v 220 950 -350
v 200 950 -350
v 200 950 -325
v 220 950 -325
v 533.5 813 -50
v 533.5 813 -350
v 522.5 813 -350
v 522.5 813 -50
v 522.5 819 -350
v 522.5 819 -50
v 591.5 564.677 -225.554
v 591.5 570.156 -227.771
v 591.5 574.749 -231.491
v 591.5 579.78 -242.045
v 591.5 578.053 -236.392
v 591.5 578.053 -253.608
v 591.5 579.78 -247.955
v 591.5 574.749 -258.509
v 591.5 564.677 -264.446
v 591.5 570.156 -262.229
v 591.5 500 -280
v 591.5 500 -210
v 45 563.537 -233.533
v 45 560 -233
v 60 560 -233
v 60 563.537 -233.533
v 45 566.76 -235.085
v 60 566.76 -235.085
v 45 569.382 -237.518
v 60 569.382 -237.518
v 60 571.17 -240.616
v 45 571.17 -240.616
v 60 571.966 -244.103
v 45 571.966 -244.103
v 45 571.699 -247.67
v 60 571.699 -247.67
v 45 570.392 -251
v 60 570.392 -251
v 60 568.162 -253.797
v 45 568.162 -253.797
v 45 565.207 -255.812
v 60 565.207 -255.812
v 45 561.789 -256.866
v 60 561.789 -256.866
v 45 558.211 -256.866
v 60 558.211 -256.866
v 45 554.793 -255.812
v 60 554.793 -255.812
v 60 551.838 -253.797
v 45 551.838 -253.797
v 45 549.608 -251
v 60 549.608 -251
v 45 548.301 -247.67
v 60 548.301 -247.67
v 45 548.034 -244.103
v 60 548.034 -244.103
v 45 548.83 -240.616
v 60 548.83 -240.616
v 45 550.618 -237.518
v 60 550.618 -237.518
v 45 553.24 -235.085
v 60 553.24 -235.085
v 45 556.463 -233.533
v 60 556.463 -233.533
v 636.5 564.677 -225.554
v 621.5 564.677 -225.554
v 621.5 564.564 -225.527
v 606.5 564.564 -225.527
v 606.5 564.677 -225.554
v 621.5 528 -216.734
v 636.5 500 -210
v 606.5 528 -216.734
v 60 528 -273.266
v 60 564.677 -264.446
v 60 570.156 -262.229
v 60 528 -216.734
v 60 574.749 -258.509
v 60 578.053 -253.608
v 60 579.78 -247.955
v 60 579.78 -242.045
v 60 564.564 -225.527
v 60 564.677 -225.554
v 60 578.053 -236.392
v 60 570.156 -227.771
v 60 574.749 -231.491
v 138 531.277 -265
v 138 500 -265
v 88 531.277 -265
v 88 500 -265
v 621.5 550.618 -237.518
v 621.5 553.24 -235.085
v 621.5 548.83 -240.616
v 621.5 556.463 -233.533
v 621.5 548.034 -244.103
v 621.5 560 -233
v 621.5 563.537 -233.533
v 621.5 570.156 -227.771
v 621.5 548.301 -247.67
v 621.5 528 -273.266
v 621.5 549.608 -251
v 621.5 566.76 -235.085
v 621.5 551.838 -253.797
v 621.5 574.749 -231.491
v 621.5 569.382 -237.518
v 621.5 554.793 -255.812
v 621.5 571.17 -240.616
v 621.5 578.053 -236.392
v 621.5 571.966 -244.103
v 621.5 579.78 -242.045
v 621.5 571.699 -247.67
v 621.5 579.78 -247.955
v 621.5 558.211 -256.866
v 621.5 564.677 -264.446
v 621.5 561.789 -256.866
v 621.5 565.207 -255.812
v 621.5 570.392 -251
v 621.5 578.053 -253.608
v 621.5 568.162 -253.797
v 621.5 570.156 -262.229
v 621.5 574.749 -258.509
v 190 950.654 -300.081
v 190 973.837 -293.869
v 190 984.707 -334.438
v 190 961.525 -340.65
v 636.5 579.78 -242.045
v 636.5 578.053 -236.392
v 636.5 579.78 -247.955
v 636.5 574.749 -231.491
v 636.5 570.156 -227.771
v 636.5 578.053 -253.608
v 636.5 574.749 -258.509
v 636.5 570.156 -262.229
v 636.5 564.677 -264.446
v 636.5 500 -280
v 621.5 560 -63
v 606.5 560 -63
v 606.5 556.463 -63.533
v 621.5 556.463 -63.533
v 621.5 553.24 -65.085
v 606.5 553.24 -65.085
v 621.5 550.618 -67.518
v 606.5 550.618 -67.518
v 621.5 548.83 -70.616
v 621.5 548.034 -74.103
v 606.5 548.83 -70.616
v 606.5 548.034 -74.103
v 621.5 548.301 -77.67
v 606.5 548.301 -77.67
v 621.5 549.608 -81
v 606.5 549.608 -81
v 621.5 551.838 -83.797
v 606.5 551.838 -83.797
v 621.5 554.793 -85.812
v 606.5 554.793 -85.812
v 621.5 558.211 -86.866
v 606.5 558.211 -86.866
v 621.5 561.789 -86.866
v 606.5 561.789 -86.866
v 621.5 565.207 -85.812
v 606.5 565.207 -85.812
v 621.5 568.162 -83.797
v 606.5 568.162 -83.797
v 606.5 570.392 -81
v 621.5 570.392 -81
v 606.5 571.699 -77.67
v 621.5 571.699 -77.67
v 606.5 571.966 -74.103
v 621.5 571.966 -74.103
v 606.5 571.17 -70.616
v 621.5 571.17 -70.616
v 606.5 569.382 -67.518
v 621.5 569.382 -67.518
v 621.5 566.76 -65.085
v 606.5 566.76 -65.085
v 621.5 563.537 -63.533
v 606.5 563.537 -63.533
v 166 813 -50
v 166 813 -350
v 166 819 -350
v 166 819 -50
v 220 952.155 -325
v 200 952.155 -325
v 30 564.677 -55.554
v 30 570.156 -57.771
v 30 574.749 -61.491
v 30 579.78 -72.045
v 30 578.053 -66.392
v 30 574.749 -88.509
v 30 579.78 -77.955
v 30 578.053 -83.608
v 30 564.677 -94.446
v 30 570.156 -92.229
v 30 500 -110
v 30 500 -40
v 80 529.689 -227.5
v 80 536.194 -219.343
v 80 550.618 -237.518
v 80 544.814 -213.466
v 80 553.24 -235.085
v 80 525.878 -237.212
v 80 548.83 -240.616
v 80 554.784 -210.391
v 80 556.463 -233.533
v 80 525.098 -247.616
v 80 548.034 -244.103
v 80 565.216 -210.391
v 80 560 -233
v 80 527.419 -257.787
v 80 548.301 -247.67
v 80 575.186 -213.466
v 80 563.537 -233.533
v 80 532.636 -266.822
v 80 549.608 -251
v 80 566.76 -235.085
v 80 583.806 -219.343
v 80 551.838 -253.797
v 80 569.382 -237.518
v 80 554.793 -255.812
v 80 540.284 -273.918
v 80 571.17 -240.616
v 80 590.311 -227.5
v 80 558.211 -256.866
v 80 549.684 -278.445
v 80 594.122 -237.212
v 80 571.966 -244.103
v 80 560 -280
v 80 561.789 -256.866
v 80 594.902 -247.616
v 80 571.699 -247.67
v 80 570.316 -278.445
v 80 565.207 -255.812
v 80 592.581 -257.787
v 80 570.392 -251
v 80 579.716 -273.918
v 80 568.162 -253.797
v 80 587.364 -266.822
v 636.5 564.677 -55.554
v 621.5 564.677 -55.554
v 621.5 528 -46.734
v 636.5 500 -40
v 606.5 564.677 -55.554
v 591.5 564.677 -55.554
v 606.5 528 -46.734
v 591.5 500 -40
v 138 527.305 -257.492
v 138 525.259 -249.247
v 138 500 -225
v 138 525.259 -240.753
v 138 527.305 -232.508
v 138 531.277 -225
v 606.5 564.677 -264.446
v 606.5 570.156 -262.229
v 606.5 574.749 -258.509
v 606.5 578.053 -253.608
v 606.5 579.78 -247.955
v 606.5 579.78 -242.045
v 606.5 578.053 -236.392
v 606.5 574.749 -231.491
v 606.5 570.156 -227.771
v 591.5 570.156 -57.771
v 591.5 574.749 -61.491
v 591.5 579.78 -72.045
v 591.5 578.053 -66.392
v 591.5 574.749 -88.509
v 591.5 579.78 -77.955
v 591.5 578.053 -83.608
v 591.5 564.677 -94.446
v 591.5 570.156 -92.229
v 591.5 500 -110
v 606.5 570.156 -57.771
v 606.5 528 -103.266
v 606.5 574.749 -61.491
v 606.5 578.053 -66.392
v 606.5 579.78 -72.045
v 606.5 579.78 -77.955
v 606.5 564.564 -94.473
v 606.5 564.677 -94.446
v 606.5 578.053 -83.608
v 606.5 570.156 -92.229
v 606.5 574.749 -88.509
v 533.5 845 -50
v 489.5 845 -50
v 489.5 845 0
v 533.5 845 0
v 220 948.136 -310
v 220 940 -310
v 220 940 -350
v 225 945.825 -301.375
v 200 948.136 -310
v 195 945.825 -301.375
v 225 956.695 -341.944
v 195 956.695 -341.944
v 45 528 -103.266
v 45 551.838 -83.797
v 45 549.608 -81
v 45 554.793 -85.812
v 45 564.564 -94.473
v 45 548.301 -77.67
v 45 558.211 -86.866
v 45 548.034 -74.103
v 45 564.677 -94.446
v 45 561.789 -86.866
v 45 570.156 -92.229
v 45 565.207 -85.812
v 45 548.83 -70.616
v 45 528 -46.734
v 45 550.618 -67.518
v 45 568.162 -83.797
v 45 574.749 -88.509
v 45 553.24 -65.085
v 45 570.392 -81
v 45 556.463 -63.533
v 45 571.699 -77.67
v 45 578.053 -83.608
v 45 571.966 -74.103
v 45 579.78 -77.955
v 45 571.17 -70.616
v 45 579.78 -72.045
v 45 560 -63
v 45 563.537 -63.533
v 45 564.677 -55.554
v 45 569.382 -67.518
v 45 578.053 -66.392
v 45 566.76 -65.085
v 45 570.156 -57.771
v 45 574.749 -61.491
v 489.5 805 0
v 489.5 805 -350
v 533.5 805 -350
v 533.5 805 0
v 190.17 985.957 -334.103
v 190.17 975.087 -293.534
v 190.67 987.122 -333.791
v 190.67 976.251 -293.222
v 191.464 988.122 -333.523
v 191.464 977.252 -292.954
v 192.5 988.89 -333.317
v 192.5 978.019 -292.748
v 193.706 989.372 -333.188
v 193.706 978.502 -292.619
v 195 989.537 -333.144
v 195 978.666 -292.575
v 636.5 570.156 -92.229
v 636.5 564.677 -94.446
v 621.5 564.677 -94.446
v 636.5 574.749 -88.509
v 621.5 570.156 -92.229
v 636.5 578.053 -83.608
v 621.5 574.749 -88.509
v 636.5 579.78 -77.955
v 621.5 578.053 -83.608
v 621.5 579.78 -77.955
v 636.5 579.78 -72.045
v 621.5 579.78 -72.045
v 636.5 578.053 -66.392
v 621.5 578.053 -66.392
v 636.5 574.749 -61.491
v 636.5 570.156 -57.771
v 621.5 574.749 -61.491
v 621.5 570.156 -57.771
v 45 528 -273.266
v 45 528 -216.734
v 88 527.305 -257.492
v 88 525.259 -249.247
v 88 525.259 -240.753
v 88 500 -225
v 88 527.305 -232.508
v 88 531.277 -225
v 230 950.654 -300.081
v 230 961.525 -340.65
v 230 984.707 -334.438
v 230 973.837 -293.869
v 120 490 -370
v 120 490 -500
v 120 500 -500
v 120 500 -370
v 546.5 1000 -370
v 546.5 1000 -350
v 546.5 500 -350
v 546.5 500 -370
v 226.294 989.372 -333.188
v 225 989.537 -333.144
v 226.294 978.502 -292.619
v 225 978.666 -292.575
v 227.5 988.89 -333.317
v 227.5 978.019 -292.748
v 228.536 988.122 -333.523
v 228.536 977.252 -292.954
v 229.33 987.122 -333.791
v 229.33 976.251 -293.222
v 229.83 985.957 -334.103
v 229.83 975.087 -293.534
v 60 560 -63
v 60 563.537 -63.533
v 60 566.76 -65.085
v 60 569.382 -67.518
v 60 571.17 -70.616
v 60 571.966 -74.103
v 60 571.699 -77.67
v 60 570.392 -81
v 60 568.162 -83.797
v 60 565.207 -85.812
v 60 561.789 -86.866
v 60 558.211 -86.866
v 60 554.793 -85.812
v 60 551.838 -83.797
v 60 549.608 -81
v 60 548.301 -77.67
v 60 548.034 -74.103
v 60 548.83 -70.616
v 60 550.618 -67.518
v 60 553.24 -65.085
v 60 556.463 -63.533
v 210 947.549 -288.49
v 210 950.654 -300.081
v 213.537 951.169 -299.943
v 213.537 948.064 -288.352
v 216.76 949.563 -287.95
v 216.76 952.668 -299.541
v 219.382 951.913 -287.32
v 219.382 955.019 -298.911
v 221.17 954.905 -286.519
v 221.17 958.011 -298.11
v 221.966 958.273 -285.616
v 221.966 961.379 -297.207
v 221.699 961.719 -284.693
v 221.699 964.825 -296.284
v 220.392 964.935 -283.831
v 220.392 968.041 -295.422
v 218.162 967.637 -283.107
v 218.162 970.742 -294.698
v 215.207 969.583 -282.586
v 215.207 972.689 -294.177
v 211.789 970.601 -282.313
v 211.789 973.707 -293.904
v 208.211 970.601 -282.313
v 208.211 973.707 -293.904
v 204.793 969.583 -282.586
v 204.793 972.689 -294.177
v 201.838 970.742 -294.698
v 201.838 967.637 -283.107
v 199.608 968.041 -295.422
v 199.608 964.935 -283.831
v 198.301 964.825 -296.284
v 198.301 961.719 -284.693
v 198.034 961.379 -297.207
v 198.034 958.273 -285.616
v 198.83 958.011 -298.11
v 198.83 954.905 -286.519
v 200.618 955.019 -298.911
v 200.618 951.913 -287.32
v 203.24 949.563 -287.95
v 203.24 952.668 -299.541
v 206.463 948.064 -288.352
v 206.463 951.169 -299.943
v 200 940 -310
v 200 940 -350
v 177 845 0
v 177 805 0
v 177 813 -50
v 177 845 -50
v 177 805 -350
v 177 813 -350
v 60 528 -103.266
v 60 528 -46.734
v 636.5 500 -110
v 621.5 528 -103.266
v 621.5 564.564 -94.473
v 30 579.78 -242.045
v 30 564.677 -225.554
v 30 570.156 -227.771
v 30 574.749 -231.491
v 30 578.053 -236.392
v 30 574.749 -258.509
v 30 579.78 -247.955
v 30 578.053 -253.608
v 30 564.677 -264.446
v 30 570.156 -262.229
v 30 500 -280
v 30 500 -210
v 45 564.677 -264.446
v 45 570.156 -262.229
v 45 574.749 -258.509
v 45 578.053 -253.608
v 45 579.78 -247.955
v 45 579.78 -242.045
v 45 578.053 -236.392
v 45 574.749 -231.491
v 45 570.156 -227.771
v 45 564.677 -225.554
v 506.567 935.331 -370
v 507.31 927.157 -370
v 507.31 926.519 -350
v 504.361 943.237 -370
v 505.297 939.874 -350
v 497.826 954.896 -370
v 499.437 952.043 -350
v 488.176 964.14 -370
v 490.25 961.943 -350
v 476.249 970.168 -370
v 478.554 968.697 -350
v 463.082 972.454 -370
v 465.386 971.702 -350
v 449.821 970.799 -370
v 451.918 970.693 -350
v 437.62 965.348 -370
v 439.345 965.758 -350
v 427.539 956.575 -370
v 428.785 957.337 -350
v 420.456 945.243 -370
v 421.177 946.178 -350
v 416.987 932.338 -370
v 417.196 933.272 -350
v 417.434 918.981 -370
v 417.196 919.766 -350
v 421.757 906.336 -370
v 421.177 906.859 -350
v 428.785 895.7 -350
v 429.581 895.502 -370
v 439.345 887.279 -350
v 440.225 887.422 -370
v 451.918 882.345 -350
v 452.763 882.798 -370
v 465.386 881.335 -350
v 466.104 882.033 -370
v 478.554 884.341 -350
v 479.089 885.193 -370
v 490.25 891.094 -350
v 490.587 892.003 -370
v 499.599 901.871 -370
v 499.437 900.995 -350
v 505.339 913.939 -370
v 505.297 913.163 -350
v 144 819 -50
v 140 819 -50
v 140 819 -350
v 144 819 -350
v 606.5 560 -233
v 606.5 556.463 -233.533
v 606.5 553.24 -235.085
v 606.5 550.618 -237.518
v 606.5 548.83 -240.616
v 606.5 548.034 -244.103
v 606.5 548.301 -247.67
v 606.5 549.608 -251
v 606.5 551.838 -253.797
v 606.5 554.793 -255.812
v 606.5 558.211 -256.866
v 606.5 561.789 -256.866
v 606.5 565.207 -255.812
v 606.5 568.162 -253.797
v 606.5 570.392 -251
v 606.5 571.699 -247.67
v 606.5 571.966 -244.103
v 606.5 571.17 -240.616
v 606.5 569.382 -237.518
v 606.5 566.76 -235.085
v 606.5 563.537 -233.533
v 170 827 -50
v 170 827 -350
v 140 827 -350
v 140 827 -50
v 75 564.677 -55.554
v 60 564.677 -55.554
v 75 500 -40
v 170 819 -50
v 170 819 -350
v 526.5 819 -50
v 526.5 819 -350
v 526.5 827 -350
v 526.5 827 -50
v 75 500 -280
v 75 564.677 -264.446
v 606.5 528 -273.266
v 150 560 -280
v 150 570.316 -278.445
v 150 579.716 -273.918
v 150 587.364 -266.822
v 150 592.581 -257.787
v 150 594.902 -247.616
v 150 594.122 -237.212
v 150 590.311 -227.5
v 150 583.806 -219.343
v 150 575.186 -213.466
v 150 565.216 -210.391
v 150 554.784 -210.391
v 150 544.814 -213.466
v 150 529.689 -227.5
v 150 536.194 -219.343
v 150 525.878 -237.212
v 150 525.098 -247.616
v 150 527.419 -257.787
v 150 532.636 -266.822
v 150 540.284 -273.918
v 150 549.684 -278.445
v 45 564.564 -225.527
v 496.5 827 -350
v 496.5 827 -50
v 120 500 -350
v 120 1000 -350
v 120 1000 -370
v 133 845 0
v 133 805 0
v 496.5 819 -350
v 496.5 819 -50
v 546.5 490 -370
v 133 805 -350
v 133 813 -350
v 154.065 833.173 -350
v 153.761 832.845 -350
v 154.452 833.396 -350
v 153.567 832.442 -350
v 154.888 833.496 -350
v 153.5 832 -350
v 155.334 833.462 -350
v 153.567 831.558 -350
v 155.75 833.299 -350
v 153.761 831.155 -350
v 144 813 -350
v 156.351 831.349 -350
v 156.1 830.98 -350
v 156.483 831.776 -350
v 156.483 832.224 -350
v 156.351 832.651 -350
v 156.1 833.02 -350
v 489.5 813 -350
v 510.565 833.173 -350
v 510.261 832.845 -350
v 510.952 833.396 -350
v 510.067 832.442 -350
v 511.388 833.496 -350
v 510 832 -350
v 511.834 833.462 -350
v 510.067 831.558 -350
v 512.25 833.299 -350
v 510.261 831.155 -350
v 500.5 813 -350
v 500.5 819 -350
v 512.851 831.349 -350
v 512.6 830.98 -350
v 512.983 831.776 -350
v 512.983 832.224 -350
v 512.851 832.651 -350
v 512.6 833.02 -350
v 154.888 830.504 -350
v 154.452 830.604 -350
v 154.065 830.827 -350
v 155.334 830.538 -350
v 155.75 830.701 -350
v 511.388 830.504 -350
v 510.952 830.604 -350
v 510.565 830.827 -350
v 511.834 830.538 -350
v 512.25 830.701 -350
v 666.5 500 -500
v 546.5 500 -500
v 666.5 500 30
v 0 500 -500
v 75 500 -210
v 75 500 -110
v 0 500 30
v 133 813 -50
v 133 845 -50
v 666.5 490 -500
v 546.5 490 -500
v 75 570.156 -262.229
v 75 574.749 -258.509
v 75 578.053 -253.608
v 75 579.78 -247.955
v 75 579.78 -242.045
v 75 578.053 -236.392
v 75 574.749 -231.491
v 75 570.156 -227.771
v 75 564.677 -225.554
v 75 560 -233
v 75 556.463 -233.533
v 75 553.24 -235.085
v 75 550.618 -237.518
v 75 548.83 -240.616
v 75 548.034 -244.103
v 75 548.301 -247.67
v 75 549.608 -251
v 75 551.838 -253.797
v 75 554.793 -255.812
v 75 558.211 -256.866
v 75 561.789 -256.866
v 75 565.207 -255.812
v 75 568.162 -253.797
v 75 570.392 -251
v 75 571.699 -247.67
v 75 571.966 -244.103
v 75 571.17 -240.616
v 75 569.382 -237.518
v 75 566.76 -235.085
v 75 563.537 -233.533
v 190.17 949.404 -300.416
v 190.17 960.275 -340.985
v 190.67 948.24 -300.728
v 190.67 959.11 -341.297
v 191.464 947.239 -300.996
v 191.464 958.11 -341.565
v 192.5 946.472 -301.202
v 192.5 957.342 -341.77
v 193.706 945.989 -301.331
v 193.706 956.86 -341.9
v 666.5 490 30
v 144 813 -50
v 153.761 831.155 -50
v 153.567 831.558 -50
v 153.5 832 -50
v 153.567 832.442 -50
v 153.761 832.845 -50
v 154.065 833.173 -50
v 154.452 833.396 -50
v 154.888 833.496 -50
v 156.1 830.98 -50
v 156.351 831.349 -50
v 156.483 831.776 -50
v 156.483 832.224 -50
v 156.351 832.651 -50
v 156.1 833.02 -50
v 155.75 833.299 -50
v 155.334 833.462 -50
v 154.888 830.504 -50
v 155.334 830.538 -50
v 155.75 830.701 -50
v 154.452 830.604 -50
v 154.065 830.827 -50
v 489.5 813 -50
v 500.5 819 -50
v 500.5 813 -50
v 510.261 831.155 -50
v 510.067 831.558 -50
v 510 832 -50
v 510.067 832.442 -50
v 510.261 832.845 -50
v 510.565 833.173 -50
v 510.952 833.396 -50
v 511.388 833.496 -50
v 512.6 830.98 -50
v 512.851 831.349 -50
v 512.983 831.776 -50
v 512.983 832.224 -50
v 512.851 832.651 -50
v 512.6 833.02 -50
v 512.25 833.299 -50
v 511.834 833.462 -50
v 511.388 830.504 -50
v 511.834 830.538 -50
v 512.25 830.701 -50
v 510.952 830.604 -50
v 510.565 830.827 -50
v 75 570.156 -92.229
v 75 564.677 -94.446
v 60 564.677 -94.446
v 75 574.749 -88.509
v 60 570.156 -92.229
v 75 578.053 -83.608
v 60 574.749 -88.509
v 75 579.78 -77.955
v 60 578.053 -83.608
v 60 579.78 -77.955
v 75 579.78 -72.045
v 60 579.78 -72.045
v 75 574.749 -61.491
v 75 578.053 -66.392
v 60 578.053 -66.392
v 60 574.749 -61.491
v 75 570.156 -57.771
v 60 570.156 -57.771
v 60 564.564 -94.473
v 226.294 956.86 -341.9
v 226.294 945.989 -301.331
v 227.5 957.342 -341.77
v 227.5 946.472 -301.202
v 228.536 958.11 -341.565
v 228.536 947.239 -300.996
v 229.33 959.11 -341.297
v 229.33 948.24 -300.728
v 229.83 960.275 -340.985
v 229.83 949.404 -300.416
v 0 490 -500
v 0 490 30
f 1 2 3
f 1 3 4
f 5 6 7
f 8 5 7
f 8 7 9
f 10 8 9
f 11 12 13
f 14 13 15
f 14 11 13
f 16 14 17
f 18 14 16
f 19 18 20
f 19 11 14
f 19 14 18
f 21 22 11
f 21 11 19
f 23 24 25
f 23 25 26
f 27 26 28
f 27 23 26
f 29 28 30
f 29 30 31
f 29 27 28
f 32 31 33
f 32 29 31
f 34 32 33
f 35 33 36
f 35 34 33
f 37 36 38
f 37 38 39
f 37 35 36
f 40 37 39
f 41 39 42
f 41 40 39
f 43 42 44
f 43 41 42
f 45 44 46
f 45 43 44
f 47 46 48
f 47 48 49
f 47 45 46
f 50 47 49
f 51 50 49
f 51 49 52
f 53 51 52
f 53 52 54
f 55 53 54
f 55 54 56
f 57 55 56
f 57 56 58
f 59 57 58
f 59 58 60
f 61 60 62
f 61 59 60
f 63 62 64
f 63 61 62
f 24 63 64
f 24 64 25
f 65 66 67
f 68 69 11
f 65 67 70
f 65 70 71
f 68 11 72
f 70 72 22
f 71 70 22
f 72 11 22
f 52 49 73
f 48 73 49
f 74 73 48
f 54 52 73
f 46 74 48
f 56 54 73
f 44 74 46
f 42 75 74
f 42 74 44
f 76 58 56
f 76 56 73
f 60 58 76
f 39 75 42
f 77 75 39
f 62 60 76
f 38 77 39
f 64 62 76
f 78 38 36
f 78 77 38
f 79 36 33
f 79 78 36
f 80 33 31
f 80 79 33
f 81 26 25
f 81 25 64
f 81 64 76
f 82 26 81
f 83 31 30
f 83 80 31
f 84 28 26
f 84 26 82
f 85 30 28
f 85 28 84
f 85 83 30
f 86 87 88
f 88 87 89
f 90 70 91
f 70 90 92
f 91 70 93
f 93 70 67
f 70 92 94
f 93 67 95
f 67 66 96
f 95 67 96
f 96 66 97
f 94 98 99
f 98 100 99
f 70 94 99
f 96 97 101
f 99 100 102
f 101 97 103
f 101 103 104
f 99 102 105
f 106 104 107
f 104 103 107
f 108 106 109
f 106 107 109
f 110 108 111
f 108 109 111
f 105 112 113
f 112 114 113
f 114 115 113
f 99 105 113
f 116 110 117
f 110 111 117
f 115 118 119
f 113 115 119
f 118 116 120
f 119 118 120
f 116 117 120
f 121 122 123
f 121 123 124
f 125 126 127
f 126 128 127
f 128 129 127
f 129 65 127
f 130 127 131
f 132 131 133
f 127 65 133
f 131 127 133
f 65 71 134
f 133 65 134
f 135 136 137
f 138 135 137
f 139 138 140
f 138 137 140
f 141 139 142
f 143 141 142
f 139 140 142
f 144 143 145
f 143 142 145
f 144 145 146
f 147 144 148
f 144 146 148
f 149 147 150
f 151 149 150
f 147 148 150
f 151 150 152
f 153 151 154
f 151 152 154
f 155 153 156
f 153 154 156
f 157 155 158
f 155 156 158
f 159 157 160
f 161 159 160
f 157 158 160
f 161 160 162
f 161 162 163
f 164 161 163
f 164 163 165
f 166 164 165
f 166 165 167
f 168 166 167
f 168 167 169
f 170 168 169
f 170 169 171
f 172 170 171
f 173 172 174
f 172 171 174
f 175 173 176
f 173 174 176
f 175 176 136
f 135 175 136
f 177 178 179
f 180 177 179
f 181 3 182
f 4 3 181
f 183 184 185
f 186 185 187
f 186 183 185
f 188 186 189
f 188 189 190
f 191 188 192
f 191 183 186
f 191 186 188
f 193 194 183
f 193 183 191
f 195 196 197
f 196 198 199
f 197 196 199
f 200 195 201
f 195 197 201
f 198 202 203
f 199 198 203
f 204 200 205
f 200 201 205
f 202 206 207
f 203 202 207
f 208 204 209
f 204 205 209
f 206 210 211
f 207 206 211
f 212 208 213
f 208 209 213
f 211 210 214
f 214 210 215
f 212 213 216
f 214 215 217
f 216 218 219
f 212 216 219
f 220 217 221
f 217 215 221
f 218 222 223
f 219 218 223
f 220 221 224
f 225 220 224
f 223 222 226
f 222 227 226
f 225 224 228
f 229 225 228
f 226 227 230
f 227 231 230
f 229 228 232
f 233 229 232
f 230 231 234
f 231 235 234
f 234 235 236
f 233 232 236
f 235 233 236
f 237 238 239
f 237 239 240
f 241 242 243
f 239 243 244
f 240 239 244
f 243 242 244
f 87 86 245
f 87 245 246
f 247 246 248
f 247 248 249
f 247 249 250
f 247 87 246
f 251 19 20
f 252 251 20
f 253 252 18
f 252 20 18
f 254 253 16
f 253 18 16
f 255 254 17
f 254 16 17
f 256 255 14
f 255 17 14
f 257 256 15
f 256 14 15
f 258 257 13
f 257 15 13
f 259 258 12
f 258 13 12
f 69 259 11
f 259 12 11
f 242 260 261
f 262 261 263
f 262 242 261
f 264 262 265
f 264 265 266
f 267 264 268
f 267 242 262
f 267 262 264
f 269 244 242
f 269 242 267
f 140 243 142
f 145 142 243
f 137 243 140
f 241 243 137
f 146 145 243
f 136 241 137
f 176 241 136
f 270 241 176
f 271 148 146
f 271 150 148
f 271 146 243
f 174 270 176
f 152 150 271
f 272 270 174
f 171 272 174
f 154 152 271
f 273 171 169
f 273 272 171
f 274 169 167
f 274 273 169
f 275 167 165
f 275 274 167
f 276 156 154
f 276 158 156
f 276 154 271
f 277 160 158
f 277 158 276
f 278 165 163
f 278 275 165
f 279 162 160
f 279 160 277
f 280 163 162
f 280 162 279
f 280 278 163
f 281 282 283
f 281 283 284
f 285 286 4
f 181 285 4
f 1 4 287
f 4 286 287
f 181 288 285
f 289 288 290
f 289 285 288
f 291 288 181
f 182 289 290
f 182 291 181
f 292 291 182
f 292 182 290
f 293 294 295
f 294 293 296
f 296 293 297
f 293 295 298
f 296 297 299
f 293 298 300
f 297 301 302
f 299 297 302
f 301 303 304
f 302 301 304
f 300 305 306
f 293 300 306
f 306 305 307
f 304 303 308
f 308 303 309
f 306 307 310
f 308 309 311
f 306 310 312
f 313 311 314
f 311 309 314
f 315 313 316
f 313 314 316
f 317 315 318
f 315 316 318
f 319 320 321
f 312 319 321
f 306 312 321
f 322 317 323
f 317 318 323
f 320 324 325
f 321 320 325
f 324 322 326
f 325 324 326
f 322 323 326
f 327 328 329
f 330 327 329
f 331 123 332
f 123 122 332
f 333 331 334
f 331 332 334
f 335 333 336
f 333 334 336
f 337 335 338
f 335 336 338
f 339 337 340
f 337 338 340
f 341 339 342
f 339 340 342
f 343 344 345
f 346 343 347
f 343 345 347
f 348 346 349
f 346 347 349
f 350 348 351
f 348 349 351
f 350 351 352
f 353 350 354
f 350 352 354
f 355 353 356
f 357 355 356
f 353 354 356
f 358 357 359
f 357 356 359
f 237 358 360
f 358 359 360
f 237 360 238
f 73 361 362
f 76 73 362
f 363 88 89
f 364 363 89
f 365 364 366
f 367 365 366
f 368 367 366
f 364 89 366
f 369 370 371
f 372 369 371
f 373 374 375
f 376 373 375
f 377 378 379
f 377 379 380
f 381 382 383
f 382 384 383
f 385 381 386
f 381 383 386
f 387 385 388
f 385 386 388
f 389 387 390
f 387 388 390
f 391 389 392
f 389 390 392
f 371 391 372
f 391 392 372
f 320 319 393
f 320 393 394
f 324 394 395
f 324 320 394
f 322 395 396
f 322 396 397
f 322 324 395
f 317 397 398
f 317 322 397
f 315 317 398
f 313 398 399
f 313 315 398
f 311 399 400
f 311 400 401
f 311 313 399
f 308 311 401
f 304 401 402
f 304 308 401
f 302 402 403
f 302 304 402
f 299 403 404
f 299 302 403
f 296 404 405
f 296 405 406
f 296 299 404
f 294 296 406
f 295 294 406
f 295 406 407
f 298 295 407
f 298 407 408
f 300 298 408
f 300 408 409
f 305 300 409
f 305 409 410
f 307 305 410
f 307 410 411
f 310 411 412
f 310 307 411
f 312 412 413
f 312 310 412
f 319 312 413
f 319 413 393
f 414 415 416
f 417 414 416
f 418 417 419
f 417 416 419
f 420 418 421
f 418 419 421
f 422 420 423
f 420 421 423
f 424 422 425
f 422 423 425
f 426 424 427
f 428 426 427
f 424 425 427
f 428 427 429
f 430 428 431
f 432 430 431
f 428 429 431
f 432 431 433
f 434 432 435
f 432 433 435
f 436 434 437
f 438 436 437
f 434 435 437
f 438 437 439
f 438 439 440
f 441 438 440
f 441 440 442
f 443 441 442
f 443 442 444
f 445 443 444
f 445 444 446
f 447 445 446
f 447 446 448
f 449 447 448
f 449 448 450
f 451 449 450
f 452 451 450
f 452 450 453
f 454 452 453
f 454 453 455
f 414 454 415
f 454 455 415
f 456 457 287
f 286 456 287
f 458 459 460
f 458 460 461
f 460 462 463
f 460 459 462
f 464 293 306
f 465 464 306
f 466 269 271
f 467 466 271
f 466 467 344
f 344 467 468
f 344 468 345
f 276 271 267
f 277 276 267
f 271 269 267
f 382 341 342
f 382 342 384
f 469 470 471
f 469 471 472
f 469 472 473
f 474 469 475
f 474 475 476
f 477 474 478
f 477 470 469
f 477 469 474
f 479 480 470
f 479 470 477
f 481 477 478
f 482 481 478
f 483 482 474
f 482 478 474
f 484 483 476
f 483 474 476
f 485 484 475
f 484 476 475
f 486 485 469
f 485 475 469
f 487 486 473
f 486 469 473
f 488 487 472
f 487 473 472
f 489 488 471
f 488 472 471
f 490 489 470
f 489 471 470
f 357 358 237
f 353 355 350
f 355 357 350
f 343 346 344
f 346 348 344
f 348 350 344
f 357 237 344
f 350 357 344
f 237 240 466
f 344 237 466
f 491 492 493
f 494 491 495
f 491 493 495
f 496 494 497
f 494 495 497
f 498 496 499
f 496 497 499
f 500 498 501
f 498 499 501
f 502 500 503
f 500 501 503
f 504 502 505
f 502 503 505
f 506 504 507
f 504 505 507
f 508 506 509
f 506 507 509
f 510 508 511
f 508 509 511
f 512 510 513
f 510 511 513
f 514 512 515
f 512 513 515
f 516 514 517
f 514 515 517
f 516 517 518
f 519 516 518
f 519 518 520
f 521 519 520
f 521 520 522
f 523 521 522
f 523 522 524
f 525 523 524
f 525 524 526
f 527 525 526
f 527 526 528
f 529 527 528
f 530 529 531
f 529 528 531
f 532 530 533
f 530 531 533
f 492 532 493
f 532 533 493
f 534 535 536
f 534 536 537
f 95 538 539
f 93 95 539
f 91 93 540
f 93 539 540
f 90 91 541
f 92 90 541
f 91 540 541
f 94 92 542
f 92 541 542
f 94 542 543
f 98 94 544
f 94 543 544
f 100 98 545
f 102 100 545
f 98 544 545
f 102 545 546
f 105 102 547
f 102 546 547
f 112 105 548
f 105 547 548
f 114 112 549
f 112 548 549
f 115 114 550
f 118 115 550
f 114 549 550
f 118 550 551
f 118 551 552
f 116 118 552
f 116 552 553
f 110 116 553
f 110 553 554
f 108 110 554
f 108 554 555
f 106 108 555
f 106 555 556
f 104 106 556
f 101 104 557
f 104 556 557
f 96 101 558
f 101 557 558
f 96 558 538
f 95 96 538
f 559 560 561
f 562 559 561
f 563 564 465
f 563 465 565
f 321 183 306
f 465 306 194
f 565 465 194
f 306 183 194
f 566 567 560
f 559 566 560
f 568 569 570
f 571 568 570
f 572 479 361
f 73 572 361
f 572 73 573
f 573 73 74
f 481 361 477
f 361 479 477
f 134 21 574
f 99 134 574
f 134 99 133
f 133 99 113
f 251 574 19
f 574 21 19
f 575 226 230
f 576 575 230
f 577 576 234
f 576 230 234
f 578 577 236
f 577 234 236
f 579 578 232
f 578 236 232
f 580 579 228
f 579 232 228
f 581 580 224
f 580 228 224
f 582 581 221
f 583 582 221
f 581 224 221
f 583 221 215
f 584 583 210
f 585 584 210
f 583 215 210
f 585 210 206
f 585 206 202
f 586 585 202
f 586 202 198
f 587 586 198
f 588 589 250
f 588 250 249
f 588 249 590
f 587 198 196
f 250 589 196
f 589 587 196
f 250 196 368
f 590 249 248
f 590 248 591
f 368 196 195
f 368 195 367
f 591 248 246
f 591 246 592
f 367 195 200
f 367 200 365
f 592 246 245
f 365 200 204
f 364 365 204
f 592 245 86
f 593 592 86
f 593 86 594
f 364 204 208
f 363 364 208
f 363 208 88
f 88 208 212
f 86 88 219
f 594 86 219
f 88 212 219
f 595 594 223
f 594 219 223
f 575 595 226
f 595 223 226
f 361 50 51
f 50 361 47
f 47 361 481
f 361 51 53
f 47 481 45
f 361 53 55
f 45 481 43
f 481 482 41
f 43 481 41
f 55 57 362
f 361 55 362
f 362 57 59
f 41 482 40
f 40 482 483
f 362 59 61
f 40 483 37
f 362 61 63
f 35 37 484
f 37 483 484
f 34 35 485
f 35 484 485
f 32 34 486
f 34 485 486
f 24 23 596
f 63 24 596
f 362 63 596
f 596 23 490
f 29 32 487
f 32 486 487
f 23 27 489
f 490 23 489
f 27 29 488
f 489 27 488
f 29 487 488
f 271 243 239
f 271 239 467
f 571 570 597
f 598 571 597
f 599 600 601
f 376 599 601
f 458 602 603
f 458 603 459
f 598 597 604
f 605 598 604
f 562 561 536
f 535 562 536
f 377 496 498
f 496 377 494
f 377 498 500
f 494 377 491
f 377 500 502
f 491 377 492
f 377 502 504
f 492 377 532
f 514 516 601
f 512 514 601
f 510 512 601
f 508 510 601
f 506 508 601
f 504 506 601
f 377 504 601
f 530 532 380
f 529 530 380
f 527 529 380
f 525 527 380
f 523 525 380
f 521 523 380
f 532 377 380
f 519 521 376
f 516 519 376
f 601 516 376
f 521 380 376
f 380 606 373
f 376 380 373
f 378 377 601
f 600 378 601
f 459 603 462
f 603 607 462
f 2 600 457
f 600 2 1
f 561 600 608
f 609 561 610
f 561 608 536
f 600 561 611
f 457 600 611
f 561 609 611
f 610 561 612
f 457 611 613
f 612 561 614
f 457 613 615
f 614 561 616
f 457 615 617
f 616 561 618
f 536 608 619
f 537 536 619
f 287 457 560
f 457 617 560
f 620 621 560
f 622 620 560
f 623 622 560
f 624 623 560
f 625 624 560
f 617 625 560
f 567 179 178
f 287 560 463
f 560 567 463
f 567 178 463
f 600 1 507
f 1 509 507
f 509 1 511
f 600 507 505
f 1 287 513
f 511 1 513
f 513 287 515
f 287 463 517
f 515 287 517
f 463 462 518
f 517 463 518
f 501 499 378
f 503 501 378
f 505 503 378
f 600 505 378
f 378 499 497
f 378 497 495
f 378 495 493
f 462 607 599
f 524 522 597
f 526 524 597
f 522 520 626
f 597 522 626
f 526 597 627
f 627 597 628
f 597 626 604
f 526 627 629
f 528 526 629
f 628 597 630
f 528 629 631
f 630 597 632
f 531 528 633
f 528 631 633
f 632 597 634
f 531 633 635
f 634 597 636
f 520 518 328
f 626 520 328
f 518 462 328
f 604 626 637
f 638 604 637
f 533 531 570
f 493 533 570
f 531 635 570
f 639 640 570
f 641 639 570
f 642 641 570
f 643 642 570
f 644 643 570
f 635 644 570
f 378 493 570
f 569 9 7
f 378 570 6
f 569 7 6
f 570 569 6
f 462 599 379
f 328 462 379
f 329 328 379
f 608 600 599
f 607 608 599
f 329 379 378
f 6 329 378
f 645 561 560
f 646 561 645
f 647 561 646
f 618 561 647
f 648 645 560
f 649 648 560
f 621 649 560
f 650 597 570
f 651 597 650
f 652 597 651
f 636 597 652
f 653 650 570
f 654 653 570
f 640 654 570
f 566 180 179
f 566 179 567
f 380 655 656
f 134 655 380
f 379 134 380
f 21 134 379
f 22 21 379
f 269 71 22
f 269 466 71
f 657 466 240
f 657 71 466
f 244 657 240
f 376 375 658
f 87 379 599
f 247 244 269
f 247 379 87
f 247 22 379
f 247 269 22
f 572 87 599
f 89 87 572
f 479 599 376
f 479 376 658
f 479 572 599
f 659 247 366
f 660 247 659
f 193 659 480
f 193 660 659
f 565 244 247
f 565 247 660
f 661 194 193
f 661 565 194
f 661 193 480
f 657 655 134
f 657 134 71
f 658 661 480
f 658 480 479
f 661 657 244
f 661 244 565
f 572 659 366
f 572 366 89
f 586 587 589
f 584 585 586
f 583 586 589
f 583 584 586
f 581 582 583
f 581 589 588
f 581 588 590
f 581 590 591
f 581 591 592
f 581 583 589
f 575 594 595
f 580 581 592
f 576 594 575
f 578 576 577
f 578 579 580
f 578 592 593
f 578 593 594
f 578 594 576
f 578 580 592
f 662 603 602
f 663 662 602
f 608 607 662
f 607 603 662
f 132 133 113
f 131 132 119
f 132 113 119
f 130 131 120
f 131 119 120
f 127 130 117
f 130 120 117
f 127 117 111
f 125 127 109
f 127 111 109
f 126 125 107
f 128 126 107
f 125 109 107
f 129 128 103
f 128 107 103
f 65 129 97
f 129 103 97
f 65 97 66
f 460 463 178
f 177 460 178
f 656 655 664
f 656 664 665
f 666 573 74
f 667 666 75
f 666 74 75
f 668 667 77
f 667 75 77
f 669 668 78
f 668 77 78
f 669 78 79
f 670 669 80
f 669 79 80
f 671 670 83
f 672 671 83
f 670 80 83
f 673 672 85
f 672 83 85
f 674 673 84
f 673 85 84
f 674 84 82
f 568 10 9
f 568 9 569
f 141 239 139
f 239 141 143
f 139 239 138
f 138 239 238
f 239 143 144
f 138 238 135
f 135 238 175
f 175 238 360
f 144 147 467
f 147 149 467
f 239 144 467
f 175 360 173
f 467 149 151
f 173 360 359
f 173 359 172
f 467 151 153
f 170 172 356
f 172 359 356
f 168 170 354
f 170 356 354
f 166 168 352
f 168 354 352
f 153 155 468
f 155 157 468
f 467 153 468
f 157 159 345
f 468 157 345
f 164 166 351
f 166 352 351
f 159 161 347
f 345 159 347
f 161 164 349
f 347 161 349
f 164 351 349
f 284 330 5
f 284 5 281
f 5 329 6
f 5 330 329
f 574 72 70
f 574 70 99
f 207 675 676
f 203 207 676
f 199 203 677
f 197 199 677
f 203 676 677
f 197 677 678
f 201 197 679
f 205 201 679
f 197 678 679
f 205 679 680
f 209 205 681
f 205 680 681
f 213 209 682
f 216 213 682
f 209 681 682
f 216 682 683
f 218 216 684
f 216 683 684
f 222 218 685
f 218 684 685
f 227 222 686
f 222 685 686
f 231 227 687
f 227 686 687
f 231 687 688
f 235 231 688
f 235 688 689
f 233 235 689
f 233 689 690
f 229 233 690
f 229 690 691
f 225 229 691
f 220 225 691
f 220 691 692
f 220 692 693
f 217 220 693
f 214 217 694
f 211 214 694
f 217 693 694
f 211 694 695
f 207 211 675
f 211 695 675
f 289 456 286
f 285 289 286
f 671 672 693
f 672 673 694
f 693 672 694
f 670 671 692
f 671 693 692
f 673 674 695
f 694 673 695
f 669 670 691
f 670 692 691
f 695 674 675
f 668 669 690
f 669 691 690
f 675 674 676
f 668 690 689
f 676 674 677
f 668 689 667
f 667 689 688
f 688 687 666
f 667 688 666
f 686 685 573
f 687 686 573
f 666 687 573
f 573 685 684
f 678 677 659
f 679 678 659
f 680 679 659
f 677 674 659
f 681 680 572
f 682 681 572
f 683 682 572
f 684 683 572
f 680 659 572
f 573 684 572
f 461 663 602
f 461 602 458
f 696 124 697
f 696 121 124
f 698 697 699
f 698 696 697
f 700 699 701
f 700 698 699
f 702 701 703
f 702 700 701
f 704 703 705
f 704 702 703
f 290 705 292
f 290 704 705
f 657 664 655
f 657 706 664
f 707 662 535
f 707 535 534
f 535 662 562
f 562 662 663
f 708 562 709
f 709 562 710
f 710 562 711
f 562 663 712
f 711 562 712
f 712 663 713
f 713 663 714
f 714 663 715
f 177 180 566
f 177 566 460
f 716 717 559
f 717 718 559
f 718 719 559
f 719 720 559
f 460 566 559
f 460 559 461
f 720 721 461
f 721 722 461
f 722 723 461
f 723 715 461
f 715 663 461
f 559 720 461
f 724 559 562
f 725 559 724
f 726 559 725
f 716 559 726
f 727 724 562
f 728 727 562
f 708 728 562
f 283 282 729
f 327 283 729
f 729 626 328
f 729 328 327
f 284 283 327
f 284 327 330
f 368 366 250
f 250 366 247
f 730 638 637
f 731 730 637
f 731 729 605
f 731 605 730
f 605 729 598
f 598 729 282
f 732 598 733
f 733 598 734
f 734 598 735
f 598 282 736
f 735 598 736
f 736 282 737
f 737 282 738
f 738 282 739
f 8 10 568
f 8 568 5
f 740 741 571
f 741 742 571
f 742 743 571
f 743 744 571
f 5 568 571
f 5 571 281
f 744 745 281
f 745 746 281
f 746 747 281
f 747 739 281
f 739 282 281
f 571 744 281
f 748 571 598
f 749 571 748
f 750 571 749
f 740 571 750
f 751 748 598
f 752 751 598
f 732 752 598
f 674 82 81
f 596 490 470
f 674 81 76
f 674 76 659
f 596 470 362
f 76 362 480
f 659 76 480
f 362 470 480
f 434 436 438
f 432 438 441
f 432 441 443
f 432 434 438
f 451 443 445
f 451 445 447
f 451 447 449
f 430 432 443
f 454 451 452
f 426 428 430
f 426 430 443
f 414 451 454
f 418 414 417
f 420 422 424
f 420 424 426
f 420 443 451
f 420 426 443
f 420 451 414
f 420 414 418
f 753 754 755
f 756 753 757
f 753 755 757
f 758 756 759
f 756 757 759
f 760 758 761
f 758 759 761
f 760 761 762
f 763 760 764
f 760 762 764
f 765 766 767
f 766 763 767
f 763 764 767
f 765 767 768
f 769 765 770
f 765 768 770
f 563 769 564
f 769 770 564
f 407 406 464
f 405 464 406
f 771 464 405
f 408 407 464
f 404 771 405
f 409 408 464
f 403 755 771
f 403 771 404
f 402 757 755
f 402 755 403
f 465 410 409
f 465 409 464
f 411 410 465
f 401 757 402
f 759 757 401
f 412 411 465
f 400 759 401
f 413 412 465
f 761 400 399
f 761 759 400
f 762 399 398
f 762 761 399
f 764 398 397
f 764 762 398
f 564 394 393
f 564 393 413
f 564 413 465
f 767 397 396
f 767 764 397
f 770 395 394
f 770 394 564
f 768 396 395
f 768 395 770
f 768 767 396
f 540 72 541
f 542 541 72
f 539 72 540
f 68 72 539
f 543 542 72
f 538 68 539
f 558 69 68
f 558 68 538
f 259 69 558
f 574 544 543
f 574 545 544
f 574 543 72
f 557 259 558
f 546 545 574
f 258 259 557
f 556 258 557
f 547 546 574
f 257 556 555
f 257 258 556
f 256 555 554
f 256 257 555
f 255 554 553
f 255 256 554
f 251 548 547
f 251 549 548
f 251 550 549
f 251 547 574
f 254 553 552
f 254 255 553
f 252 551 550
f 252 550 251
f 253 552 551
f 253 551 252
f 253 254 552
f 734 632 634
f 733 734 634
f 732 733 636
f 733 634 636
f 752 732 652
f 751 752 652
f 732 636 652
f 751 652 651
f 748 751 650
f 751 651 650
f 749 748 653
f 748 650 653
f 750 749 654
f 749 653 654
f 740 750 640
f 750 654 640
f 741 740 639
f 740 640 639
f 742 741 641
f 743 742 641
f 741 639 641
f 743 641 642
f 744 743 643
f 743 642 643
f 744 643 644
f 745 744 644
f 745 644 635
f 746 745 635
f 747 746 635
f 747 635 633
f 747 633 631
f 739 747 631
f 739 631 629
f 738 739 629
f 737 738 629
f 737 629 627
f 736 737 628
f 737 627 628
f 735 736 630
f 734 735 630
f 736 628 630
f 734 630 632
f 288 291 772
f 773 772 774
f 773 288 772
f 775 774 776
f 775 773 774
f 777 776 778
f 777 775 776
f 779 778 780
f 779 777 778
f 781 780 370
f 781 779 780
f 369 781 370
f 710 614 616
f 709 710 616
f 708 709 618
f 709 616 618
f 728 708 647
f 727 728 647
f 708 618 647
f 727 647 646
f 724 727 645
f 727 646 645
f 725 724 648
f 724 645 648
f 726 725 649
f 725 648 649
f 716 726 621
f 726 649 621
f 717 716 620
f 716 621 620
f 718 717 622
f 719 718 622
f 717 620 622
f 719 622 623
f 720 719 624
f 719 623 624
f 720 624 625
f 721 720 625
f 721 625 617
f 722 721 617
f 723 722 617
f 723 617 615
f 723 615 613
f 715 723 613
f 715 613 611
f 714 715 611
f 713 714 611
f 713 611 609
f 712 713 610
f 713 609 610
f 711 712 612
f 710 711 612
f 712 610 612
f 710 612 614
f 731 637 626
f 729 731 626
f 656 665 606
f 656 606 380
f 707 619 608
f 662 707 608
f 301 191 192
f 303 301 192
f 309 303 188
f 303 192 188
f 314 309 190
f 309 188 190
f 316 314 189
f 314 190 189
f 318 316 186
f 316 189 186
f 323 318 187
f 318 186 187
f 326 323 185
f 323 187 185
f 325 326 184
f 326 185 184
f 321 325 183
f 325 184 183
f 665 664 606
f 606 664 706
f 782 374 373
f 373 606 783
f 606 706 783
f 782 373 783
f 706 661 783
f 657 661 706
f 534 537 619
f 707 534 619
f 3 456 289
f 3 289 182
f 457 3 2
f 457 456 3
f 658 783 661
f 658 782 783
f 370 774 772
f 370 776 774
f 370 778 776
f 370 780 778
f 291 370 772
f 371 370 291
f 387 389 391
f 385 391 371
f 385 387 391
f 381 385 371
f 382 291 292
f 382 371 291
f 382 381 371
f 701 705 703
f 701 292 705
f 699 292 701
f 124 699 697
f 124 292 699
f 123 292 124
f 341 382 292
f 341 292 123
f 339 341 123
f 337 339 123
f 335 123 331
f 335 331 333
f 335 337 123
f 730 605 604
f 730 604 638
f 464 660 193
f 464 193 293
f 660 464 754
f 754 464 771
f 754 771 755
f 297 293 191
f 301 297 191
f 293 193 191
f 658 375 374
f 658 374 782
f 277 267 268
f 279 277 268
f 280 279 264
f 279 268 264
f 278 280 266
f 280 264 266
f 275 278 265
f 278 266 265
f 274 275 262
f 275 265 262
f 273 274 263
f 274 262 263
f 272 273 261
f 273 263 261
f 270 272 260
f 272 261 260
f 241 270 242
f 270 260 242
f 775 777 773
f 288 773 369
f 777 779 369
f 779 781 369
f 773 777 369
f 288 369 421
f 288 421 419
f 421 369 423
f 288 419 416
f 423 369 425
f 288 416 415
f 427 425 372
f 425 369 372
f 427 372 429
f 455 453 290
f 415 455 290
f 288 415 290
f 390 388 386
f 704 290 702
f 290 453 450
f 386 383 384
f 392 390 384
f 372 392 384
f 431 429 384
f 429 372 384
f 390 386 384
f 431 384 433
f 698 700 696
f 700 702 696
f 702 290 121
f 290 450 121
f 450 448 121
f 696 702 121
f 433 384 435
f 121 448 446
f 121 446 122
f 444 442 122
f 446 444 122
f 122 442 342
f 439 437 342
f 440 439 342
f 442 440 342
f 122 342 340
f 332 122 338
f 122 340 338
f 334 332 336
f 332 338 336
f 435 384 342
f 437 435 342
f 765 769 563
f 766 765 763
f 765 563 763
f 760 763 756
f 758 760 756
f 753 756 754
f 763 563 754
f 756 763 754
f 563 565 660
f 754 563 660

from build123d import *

# Parameters (mm, degrees)
SKETCH_2_W            = 666.5
SKETCH_2_H            = 490
EXTRUDE_1_DEPTH       = 500
SKETCH_3_W            = 45
SKETCH_3_H            = 70
EXTRUDE_2_DEPTH       = 80
CUT_EXTRUDE_1_DEPTH   = 800
EXTRUDE_5_DEPTH       = 500
SKETCH_8_R            = 1.5
EXTRUDE_6_DEPTH       = 300
SKETCH_20_W           = 751.278853788
SKETCH_20_H           = 520
CUT_EXTRUDE_5_DEPTH   = 490
SKETCH_22_R           = 12
CUT_EXTRUDE_7_DEPTH   = 15
SKETCH_23_W           = 120
SKETCH_23_H           = 200
CUT_EXTRUDE_8_DEPTH   = 30
SKETCH_24_W           = 20
SKETCH_24_H           = 10
EXTRUDE_10_DEPTH      = 40
SKETCH_25_W           = 20
SKETCH_25_H           = 15
EXTRUDE_11_DEPTH      = 10
EXTRUDE_12_DEPTH      = 12
EXTRUDE_12_DEPTH_BACK = 30
FILLET_1_R            = 5
SKETCH_27_R           = 12
EXTRUDE_13_DEPTH      = 12
SKETCH_28_R           = 12
EXTRUDE_14_DEPTH      = 5
SKETCH_29_R           = 35
EXTRUDE_15_DEPTH      = 70
EXTRUDE_16_DEPTH      = 33
CUT_EXTRUDE_START     = -15
SKETCH_31_R           = 12
CUT_EXTRUDE_9_DEPTH   = 15
SKETCH_32_W           = 426.5
SKETCH_32_H           = 130
CUT_EXTRUDE_10_DEPTH  = 126
SKETCH_33_R           = 45.31
CUT_EXTRUDE_11_DEPTH  = 44
SKETCH_35_W           = 44
SKETCH_35_H           = 40
EXTRUDE_17_DEPTH      = 50
SKETCH_37_W           = 666.5
SKETCH_37_H           = 10
EXTRUDE_19_DEPTH      = 40
SKETCH_38_W           = 120
SKETCH_38_H           = 10
EXTRUDE_20_DEPTH      = 200


with BuildPart() as part:
    # 草图2 → 凸台-拉伸1 (new body)
    with BuildSketch(Plane(origin=(0, 0, 0), x_dir=(1, 0, 0), z_dir=(0, 1, 0))):
        with Locations((333.25, 255)):
            Rectangle(SKETCH_2_W, SKETCH_2_H)
    extrude(amount=EXTRUDE_1_DEPTH)

    # 草图3 → 凸台-拉伸2 (add)
    with BuildSketch(Plane(origin=(0, 500, 0), x_dir=(1, 0, 0), z_dir=(0, 1, 0))):
        with Locations((52.5, 75)):
            Rectangle(SKETCH_3_W, SKETCH_3_H)
        with Locations((52.5, 245)):
            Rectangle(SKETCH_3_W, SKETCH_3_H)
        with Locations((614, 245)):
            Rectangle(SKETCH_3_W, SKETCH_3_H)
        with Locations((614, 75)):
            Rectangle(SKETCH_3_W, SKETCH_3_H)
    extrude(amount=EXTRUDE_2_DEPTH)

    # 草图4 → 切除-拉伸1 (cut)
    with BuildSketch(Plane.ZY.offset(-30)):
        with BuildLine():
            Line((-280, 500), (-264.445556098, 564.676574391))
            ThreePointArc((-264.445556098, 564.676574391), (-245, 580), (-225.554443902, 564.676574391))
            Line((-225.554443902, 564.676574391), (-210, 500))
            Line((-210, 500), (-110, 500))
            Line((-110, 500), (-94.445556098, 564.676574391))
            ThreePointArc((-94.445556098, 564.676574391), (-75, 580), (-55.554443902, 564.676574391))
            Line((-55.554443902, 564.676574391), (-40, 500))
            Line((-40, 500), (-40, 590.908516605))
            Line((-40, 590.908516605), (-280, 590.908516605))
            Line((-280, 590.908516605), (-280, 580))
            Line((-280, 580), (-280, 500))
        make_face()
    extrude(amount=-CUT_EXTRUDE_1_DEPTH, mode=Mode.SUBTRACT)

    # 草图7 → 凸台-拉伸5 (add)
    with BuildSketch(Plane(origin=(0, 500, 0), x_dir=(1, 0, 0), z_dir=(0, 1, 0))):
        Polygon((476.5, 370), (546.5, 370), (546.5, 350), (476.5, 350), (120, 350), (120, 370), align=None)
    extrude(amount=EXTRUDE_5_DEPTH)

    # 草图8 → 凸台-拉伸6 (add)
    with BuildSketch(Plane.XY.offset(-350)):
        with Locations(Location((155, 832, 0), (0, 0, 180))):
            Circle(SKETCH_8_R)
        with Locations(Location((511.5, 832, 0), (0, 0, 180))):
            Circle(SKETCH_8_R)
        Polygon((177, 805), (177, 813), (166, 813), (166, 819), (170, 819), (170, 827), (140, 827), (140, 819), (144, 819), (144, 813), (133, 813), (133, 805), align=None)
        Polygon((500.5, 813), (489.5, 813), (489.5, 805), (533.5, 805), (533.5, 813), (522.5, 813), (522.5, 819), (526.5, 819), (526.5, 827), (496.5, 827), (496.5, 819), (500.5, 819), align=None)
    extrude(amount=EXTRUDE_6_DEPTH)

    # 草图20 → 切除-拉伸5 (cut)
    with BuildSketch(Plane.XZ):
        with Locations((375.639426894, -260)):
            Rectangle(SKETCH_20_W, SKETCH_20_H)
    extrude(amount=-CUT_EXTRUDE_5_DEPTH, mode=Mode.SUBTRACT)

    # 草图22 → 切除-拉伸7 (cut)
    # profile 1 of 2: a face of its own
    with BuildSketch(Plane.ZY.offset(-45)):
        with BuildLine():
            Line((-264.44592578, 564.676479403), (-273.266117859, 528))
            Line((-273.266117859, 528), (-216.733882141, 528))
            Line((-216.733882141, 528), (-225.52728646, 564.563651658))
            ThreePointArc((-225.52728646, 564.563651658), (-244.942017925, 580.000253177), (-264.44592578, 564.676479403))
        make_face()
        with Locations((-245, 560)):
            Circle(SKETCH_22_R, mode=Mode.SUBTRACT)
    # profile 2 of 2: a face of its own
    with BuildSketch(Plane.ZY.offset(-45)):
        with BuildLine():
            ThreePointArc((-55.55407422, 564.676479403), (-75.057982075, 580.000253177), (-94.47271354, 564.563651658))
            Line((-94.47271354, 564.563651658), (-103.266117859, 528))
            Line((-103.266117859, 528), (-46.733882141, 528))
            Line((-46.733882141, 528), (-55.55407422, 564.676479403))
        make_face()
        with Locations((-75, 560)):
            Circle(SKETCH_22_R, mode=Mode.SUBTRACT)
    extrude(amount=-CUT_EXTRUDE_7_DEPTH, mode=Mode.SUBTRACT)

    # 草图23 → 切除-拉伸8 (cut)
    with BuildSketch(Plane(origin=(0, 500, 0), x_dir=(1, 0, 0), z_dir=(0, 1, 0))):
        with Locations((606.5, 400)):
            Rectangle(SKETCH_23_W, SKETCH_23_H)
        with Locations((60, 400)):
            Rectangle(SKETCH_23_W, SKETCH_23_H)
    extrude(amount=-CUT_EXTRUDE_8_DEPTH, mode=Mode.SUBTRACT)

    # 草图24 → 凸台-拉伸10 (add)
    with BuildSketch(Plane.XY.offset(-350)):
        with Locations((210, 945)):
            Rectangle(SKETCH_24_W, SKETCH_24_H)
    extrude(amount=EXTRUDE_10_DEPTH)

    # 草图25 → 凸台-拉伸11 (add)
    with BuildSketch(Plane(origin=(0, 950, 0), x_dir=(1, 0, 0), z_dir=(0, 1, 0))):
        with Locations((210, 317.5)):
            Rectangle(SKETCH_25_W, SKETCH_25_H)
    extrude(amount=EXTRUDE_11_DEPTH)

    # 草图26 → 凸台-拉伸12 (add, two sides: drawn at the far end of the back side and taken through both)
    with BuildSketch(Plane(origin=(0, 141.807806183, -529.233937587), x_dir=(1, 0, 0), z_dir=(0, -0.25881904510252135, 0.9659258262890681)).offset(-EXTRUDE_12_DEPTH_BACK)):
        Polygon((190, 839.594999439), (190, 869.594999439), (230, 869.594999439), (230, 839.594999439), (230, 835.594999439), (190, 835.594999439), align=None)
    extrude(amount=EXTRUDE_12_DEPTH + EXTRUDE_12_DEPTH_BACK)

    # 圆角1
    fillet_1_edges = [part.edges().sort_by_distance(p)[0] for p in [
        (230, 951.259967865, -321.659370176),
        (190, 951.259967865, -321.659370176),
        (190, 984.101445959, -312.859522643),
        (230, 984.101445959, -312.859522643),
    ]]
    fillet(fillet_1_edges, radius=FILLET_1_R)

    # 草图27 → 凸台-拉伸13 (add)
    with BuildSketch(Plane(origin=(0, 138.701977642, -517.642827671), x_dir=(1, 0, 0), z_dir=(0, -0.25881904510252535, 0.9659258262890672))):
        with Locations(Location((210, 852.594999439, 0), (0, 0, 270))):
            Circle(SKETCH_27_R)
    extrude(amount=EXTRUDE_13_DEPTH)

    # 草图28 → 凸台-拉伸14 (add)
    with BuildSketch(Plane(origin=(75, 0, 0), x_dir=(0, 0, -1), z_dir=(1, 0, 0))):
        with Locations(Location((245, 560, 0), (0, 0, 180))):
            Circle(SKETCH_28_R)
    extrude(amount=EXTRUDE_14_DEPTH)

    # 草图29 → 凸台-拉伸15 (add)
    with BuildSketch(Plane(origin=(80, 0, 0), x_dir=(0, 0, -1), z_dir=(1, 0, 0))):
        with Locations((245, 560)):
            Circle(SKETCH_29_R)
    extrude(amount=EXTRUDE_15_DEPTH)

    # 草图30 → 凸台-拉伸16 (add)
    with BuildSketch(Plane(origin=(0, 500, 0), x_dir=(1, 0, 0), z_dir=(0, 1, 0))):
        Polygon((128, 265), (138, 265), (138, 225), (128, 225), (88, 225), (88, 233), (88, 257), (88, 265), align=None)
    extrude(amount=EXTRUDE_16_DEPTH)

    # 草图31 → 切除-拉伸9 (cut)
    # profile 1 of 2: a face of its own
    with BuildSketch(Plane(origin=(621.5, 0, 0), x_dir=(0, 0, -1), z_dir=(1, 0, 0)).offset(CUT_EXTRUDE_START)):
        with BuildLine():
            Line((55.55407422, 564.676479403), (46.733882141, 528))
            Line((46.733882141, 528), (103.266117859, 528))
            Line((103.266117859, 528), (94.47271354, 564.563651658))
            ThreePointArc((94.47271354, 564.563651658), (75.057982075, 580.000253177), (55.55407422, 564.676479403))
        make_face()
        with Locations(Location((75, 560, 0), (0, 0, 180))):
            Circle(SKETCH_31_R, mode=Mode.SUBTRACT)
    # profile 2 of 2: a face of its own
    with BuildSketch(Plane(origin=(621.5, 0, 0), x_dir=(0, 0, -1), z_dir=(1, 0, 0)).offset(CUT_EXTRUDE_START)):
        with BuildLine():
            ThreePointArc((264.44592578, 564.676479403), (244.942017925, 580.000253177), (225.52728646, 564.563651658))
            Line((225.52728646, 564.563651658), (216.733882141, 528))
            Line((216.733882141, 528), (273.266117859, 528))
            Line((273.266117859, 528), (264.44592578, 564.676479403))
        make_face()
        with Locations(Location((245, 560, 0), (0, 0, 180))):
            Circle(SKETCH_31_R, mode=Mode.SUBTRACT)
    extrude(amount=CUT_EXTRUDE_9_DEPTH, mode=Mode.SUBTRACT)

    # 草图32 → 切除-拉伸10 (cut)
    with BuildSketch(Plane(origin=(0, 500, 0), x_dir=(1, 0, 0), z_dir=(0, 1, 0))):
        with Locations((333.25, 435)):
            Rectangle(SKETCH_32_W, SKETCH_32_H)
    extrude(amount=-CUT_EXTRUDE_10_DEPTH, mode=Mode.SUBTRACT)

    # 草图33 → 切除-拉伸11 (cut, along a direction that is not the sketch's normal)
    with BuildSketch(Plane.XY.offset(-350)):
        with Locations((462, 926.518617387)):
            Circle(SKETCH_33_R)
    extrude(amount=-CUT_EXTRUDE_11_DEPTH, dir=(5.875812413124604e-15, -0.031880547720424424, 0.9994916861470363), mode=Mode.SUBTRACT)

    # 草图35 → 凸台-拉伸17 (add)
    with BuildSketch(Plane.XY.offset(-50)):
        with Locations((155, 825)):
            Rectangle(SKETCH_35_W, SKETCH_35_H)
        with Locations((511.5, 825)):
            Rectangle(SKETCH_35_W, SKETCH_35_H)
    extrude(amount=EXTRUDE_17_DEPTH)

    # 草图37 → 凸台-拉伸19 (add)
    with BuildSketch(Plane.XY.offset(-10)):
        with Locations((333.25, 495)):
            Rectangle(SKETCH_37_W, SKETCH_37_H)
    extrude(amount=EXTRUDE_19_DEPTH)

    # 草图38 → 凸台-拉伸20 (add)
    with BuildSketch(Plane(origin=(0, 0, -300), x_dir=(-1, 0, 0), z_dir=(0, 0, -1))):
        with Locations((-606.5, 495)):
            Rectangle(SKETCH_38_W, SKETCH_38_H)
        with Locations((-60, 495)):
            Rectangle(SKETCH_38_W, SKETCH_38_H)
    extrude(amount=EXTRUDE_20_DEPTH)


solid = part.part
